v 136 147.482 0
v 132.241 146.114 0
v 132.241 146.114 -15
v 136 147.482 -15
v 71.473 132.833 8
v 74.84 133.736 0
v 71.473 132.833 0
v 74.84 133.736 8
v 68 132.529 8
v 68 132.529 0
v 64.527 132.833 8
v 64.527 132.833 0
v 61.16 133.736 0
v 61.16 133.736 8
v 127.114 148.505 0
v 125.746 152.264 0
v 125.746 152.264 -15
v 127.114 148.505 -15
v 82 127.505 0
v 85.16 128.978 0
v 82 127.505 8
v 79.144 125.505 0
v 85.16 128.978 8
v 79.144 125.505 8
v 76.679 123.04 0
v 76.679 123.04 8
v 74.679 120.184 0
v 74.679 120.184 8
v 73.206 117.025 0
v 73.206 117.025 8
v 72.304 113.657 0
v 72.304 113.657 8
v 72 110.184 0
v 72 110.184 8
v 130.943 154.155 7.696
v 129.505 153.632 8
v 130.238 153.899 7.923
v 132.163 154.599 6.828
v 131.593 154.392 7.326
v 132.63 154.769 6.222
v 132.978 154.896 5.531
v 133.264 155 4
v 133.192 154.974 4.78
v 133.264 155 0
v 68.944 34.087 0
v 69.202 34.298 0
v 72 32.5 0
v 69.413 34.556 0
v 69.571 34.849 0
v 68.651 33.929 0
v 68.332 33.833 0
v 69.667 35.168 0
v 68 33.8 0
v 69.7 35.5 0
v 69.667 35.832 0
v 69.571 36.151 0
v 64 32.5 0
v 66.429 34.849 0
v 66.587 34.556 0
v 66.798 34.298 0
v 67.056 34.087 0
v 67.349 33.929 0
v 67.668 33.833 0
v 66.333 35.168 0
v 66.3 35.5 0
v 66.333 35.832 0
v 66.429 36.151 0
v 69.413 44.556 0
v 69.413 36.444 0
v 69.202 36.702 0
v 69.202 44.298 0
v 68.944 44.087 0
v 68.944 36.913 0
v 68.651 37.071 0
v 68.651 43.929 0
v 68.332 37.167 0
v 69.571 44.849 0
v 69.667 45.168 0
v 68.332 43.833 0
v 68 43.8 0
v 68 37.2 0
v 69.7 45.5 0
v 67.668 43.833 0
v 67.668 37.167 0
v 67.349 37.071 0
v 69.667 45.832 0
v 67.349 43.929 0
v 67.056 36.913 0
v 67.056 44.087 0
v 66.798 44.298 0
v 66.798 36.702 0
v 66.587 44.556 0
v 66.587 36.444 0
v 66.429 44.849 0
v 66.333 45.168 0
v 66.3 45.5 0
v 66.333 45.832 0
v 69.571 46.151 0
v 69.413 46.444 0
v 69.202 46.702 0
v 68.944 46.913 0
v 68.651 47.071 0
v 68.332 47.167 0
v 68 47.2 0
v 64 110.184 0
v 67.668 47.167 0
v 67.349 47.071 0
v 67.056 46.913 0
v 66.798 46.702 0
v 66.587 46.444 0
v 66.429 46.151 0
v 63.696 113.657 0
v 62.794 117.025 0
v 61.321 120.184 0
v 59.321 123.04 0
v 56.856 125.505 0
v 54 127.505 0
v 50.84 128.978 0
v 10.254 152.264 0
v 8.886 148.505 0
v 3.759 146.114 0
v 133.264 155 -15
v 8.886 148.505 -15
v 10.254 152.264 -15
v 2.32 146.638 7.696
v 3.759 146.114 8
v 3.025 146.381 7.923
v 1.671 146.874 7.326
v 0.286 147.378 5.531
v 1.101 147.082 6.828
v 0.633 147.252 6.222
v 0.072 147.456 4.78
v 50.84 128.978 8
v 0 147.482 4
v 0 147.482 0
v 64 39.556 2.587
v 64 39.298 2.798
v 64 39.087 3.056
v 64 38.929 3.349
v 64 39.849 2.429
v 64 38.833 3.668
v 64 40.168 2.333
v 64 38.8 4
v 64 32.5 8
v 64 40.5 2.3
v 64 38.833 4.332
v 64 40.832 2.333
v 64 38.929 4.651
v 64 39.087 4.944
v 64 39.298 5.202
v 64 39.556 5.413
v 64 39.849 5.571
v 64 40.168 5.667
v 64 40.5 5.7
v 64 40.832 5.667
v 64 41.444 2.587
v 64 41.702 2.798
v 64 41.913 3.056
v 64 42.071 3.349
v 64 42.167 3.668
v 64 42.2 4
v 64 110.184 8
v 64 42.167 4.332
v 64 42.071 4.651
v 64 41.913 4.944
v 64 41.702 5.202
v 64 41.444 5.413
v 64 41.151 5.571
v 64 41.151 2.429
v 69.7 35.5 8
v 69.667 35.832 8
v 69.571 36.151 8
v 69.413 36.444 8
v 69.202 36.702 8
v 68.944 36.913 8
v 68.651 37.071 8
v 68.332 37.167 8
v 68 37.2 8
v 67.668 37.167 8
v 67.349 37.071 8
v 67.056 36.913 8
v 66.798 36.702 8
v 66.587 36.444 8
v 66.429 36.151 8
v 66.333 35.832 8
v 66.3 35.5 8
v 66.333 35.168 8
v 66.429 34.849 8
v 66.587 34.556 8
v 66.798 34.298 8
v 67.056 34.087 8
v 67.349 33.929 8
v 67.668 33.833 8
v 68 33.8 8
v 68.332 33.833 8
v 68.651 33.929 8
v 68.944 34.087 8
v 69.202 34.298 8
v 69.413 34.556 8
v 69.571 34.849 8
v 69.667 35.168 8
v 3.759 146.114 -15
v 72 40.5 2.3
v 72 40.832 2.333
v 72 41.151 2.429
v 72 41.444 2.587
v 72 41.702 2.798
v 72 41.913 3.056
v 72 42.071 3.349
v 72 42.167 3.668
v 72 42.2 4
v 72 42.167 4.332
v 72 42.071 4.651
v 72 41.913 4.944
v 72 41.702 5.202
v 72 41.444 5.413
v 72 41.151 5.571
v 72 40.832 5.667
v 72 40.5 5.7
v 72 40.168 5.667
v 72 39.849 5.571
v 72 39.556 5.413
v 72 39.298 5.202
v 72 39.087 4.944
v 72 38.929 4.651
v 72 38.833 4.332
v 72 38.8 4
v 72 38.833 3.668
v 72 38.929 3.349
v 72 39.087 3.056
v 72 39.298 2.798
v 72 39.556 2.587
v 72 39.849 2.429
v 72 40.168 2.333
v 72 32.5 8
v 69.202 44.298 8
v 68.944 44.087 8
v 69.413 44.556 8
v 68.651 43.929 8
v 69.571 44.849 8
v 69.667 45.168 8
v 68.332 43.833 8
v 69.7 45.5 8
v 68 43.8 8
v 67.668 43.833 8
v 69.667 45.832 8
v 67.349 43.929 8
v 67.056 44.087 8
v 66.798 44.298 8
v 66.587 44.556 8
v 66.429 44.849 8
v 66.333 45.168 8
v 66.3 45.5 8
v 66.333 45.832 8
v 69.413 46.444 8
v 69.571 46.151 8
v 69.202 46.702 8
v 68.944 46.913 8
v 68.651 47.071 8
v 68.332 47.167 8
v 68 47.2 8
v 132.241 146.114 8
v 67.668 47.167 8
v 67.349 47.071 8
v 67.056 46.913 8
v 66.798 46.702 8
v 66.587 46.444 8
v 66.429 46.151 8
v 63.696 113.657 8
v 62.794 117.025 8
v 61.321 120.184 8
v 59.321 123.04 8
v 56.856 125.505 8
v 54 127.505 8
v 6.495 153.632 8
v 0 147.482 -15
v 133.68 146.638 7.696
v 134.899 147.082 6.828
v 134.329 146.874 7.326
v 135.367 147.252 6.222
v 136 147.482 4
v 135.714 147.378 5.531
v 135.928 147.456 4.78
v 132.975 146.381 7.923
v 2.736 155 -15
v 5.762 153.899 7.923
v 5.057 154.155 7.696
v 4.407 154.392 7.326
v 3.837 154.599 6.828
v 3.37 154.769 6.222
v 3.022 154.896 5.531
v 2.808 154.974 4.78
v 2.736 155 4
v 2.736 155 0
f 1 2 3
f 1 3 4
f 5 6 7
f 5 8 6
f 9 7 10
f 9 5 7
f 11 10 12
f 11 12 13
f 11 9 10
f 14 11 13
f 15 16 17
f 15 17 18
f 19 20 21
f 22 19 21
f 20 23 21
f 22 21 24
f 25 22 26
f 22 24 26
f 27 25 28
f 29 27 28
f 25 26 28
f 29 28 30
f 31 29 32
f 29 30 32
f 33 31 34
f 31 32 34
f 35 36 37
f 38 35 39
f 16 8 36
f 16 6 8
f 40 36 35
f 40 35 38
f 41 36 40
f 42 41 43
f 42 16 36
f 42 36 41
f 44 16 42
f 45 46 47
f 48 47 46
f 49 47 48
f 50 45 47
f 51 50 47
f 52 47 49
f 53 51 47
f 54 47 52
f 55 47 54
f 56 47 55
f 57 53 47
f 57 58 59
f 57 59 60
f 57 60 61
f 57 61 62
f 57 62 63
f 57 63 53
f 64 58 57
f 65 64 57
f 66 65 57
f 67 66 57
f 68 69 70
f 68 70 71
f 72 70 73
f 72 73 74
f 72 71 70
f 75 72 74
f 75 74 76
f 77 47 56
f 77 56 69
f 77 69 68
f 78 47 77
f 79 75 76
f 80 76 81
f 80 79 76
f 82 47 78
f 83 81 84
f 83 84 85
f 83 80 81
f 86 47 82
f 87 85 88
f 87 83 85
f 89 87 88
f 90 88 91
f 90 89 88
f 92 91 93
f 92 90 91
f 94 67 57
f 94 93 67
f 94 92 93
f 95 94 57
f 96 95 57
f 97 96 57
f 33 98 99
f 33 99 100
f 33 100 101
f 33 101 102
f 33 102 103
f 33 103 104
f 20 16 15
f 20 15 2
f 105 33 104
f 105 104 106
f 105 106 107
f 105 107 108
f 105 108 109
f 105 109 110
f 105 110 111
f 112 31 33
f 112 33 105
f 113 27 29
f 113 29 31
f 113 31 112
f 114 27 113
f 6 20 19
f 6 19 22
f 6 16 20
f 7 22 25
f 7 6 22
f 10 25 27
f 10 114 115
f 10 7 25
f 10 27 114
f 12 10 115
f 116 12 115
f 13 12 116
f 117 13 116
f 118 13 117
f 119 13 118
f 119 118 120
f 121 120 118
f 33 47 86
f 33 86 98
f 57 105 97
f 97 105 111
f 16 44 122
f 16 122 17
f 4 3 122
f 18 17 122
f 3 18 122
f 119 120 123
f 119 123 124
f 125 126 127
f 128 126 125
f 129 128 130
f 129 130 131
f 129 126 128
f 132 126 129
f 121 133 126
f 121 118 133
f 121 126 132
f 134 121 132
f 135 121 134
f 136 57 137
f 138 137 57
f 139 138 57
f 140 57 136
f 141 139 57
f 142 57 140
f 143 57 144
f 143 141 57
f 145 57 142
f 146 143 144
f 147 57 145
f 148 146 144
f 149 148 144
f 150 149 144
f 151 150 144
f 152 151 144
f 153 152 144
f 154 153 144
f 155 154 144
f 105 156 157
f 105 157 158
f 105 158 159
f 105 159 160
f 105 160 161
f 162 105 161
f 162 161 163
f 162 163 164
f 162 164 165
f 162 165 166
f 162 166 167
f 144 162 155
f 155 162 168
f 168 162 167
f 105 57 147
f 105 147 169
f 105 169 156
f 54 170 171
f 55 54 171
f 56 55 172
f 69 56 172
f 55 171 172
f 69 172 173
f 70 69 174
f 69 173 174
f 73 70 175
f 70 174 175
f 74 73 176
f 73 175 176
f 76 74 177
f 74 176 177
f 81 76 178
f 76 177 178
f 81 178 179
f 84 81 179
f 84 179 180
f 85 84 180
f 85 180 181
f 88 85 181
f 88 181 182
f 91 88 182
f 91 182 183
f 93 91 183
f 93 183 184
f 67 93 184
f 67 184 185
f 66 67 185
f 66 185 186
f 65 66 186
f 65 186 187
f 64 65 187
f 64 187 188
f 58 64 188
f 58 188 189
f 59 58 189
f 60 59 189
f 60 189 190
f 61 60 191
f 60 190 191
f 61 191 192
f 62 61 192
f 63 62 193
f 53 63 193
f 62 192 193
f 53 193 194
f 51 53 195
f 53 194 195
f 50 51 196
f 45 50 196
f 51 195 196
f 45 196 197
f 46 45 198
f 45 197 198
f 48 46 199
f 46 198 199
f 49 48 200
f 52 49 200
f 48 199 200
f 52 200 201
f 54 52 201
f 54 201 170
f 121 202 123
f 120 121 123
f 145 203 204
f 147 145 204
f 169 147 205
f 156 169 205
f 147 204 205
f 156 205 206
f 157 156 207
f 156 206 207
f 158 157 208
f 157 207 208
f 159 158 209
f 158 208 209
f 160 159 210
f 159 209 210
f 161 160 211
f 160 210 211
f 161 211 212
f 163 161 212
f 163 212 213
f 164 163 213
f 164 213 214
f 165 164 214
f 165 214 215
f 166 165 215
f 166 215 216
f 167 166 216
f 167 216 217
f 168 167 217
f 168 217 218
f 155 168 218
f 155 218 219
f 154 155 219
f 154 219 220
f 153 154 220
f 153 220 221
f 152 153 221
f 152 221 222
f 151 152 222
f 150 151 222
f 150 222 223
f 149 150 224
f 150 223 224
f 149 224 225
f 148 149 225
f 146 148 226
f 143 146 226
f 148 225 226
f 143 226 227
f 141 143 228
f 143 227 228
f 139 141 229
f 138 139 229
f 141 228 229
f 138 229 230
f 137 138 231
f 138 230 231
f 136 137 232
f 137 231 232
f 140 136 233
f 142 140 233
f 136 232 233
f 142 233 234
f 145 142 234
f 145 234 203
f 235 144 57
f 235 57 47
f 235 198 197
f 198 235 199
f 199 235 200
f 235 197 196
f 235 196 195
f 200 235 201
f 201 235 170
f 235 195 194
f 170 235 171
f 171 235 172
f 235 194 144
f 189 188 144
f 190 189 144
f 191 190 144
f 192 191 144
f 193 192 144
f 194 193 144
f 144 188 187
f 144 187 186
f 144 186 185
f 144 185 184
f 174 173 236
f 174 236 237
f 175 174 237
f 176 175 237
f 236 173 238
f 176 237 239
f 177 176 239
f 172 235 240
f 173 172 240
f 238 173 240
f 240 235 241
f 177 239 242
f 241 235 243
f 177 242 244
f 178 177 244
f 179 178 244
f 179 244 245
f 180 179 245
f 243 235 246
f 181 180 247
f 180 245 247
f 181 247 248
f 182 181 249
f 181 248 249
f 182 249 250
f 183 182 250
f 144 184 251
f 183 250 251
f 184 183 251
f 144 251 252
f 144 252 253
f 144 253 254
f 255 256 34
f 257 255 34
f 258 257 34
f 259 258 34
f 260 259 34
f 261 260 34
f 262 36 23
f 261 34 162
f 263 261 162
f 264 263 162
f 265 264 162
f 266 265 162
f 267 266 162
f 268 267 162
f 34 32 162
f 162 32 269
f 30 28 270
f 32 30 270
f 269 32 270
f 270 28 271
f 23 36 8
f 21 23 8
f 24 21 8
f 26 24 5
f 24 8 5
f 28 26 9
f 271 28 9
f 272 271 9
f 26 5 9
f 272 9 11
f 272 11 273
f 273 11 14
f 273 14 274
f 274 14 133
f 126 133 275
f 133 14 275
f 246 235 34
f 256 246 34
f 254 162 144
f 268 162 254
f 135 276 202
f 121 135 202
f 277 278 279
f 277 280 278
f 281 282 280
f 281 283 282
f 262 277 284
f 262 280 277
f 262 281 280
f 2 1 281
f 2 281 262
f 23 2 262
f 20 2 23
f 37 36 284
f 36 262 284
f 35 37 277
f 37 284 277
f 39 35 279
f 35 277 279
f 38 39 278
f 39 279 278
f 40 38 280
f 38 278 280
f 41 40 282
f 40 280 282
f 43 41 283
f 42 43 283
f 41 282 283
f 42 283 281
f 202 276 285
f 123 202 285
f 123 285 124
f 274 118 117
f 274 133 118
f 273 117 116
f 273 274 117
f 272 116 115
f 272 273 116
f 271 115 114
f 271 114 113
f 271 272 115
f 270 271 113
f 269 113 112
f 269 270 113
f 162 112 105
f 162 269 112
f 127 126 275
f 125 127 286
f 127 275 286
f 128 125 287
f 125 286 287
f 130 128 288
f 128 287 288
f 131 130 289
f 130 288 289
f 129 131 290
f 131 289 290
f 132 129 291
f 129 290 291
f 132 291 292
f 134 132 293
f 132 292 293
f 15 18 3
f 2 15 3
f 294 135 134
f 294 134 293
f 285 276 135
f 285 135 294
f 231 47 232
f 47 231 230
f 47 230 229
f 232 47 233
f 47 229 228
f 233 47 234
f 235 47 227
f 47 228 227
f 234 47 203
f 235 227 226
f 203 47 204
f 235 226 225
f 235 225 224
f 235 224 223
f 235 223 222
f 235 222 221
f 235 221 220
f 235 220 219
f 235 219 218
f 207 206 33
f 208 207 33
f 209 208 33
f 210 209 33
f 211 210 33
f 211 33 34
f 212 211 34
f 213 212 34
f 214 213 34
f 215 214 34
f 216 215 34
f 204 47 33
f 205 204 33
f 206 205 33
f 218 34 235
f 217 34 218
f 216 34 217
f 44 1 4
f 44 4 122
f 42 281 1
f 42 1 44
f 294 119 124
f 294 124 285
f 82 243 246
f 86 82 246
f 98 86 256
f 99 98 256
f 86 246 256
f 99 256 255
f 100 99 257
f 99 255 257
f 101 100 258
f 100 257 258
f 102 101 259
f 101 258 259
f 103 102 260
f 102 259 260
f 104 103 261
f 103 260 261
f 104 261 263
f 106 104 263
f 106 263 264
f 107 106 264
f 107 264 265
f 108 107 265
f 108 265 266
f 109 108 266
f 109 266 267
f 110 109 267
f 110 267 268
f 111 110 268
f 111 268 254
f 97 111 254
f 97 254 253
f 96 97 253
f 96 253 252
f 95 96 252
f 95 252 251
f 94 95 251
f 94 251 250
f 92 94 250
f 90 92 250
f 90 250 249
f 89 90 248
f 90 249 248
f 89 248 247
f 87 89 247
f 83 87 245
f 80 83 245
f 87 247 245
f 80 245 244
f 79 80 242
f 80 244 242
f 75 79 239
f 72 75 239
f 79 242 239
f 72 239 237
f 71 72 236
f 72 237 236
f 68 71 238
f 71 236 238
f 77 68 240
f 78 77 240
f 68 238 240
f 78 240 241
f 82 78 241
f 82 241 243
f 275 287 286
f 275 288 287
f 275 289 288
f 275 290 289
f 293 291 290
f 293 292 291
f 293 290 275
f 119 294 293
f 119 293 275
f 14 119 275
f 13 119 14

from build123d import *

# Parameters (mm, degrees)
BOSS_EXTRU_1_DEPTH      = 8
BOSS_EXTRU_2_DEPTH      = 15
CONG_1_R                = 20
CONG_2_R                = 4
ESQUISSE3_R             = 7.5
BOSS_EXTRU_3_DEPTH      = 8
ENL_V_MAT_EXTRU_1_DEPTH = 172.56339936
ESQUISSE5_W             = 8
ESQUISSE5_H             = 15
ENL_V_MAT_EXTRU_2_DEPTH = 7.5
ESQUISSE6_W             = 8
ESQUISSE6_H             = 15
ENL_V_MAT_EXTRU_3_DEPTH = 32.5
ESQUISSE7_R             = 1.5
ENL_V_MAT_EXTRU_4_DEPTH = 8
D_GAGEMENT_M31_D        = 3.4
D_GAGEMENT_M31_DEPTH    = 10
D_GAGEMENT_M31_TIP      = 1.021463052
ESQUISSE10_R            = 1.5
ENL_V_MAT_EXTRU_5_DEPTH = 8
D_GAGEMENT_M32_D        = 3.4
D_GAGEMENT_M32_DEPTH    = 10
D_GAGEMENT_M32_TIP      = 1.021463052


with BuildPart() as part:
    # Esquisse1 → Boss.-Extru.1 (new body)
    with BuildSketch(Plane.XY):
        Polygon((64, 0), (64, 124.188364041), (0, 147.482459034), (2.736161147, 155), (68, 131.245905283), (133.263838853, 155), (136, 147.482459034), (72, 124.188364041), (72, 0), align=None)
    extrude(amount=BOSS_EXTRU_1_DEPTH)

    # Esquisse2 → Boss.-Extru.2 (add)
    with BuildSketch(Plane(origin=(0, 0, 0), x_dir=(-1, 0, 0), z_dir=(0, 0, -1))):
        Polygon((-132.241229517, 146.11437846), (-136, 147.482459034), (-133.263838853, 155), (-125.746297887, 152.263838853), (-127.11437846, 148.50506837), align=None)
        Polygon((0, 147.482459034), (-3.758770483, 146.11437846), (-8.88562154, 148.50506837), (-10.253702113, 152.263838853), (-2.736161147, 155), align=None)
    extrude(amount=BOSS_EXTRU_2_DEPTH)

    # Congé1
    cong_1_edges = [part.edges().sort_by_distance(p)[0] for p in [
        (64, 124.188364041, 4),
        (68, 131.245905283, 4),
        (72, 124.188364041, 4),
    ]]
    fillet(cong_1_edges, radius=CONG_1_R)

    # Congé2
    cong_2_edges = [part.edges().sort_by_distance(p)[0] for p in [
        (134.631919427, 151.241229517, 8),
        (1.368080573, 151.241229517, 8),
    ]]
    fillet(cong_2_edges, radius=CONG_2_R)

    # Esquisse3 → Boss.-Extru.3 (add)
    with BuildSketch(Plane.ZY.offset(-64)):
        with Locations((4, 0)):
            Circle(ESQUISSE3_R)
    extrude(amount=-BOSS_EXTRU_3_DEPTH)

    # Esquisse4 → Enlèv. mat.-Extru.1 (cut, through all)
    with BuildSketch(Plane.ZY.offset(-64)):
        with BuildLine():
            Line((2.25357508, 2.8), (5.74642492, 2.8))
            ThreePointArc((5.74642492, 2.8), (4, -3.3), (2.25357508, 2.8))
        make_face()
    extrude(amount=-ENL_V_MAT_EXTRU_1_DEPTH, mode=Mode.SUBTRACT)

    # Esquisse5 → Enlèv. mat.-Extru.2 (cut)
    with BuildSketch(Plane(origin=(0, 0, 0), x_dir=(1, 0, 0), z_dir=(0, 1, 0))):
        with Locations((68, -4)):
            Rectangle(ESQUISSE5_W, ESQUISSE5_H)
    extrude(amount=-ENL_V_MAT_EXTRU_2_DEPTH, mode=Mode.SUBTRACT)

    # Esquisse6 → Enlèv. mat.-Extru.3 (cut)
    with BuildSketch(Plane.XZ):
        with Locations((68, 4)):
            Rectangle(ESQUISSE6_W, ESQUISSE6_H)
    extrude(amount=-ENL_V_MAT_EXTRU_3_DEPTH, mode=Mode.SUBTRACT)

    # Esquisse7 → Enlèv. mat.-Extru.4 (cut)
    with BuildSketch(Plane.ZY.offset(-64)):
        with Locations(Location((4, 40.5, 0), (0, 0, 270))):
            Circle(ESQUISSE7_R)
    extrude(amount=-ENL_V_MAT_EXTRU_4_DEPTH, mode=Mode.SUBTRACT)

    # Dégagement M31
    with Locations(Plane.ZY.offset(-64)):
        with Locations((4, 40.5)):
            Hole(D_GAGEMENT_M31_D / 2, depth=D_GAGEMENT_M31_DEPTH)
            with Locations((0, 0, -(D_GAGEMENT_M31_DEPTH + D_GAGEMENT_M31_TIP / 2))):  # 118° drill point
                Cone(0, D_GAGEMENT_M31_D / 2, D_GAGEMENT_M31_TIP, mode=Mode.SUBTRACT)

    # Esquisse10 → Enlèv. mat.-Extru.5 (cut)
    with BuildSketch(Plane.XY.offset(8)):
        with Locations((68, 35.5)):
            Circle(ESQUISSE10_R)
        with Locations((68, 45.5)):
            Circle(ESQUISSE10_R)
    extrude(amount=-ENL_V_MAT_EXTRU_5_DEPTH, mode=Mode.SUBTRACT)

    # Dégagement M32
    with Locations(Plane(origin=(0, 0, 0), x_dir=(-1, 0, 0), z_dir=(0, 0, -1))):
        with Locations((-68, 45.5), (-68, 35.5)):
            Hole(D_GAGEMENT_M32_D / 2, depth=D_GAGEMENT_M32_DEPTH)
            with Locations((0, 0, -(D_GAGEMENT_M32_DEPTH + D_GAGEMENT_M32_TIP / 2))):  # 118° drill point
                Cone(0, D_GAGEMENT_M32_D / 2, D_GAGEMENT_M32_TIP, mode=Mode.SUBTRACT)


solid = part.part
